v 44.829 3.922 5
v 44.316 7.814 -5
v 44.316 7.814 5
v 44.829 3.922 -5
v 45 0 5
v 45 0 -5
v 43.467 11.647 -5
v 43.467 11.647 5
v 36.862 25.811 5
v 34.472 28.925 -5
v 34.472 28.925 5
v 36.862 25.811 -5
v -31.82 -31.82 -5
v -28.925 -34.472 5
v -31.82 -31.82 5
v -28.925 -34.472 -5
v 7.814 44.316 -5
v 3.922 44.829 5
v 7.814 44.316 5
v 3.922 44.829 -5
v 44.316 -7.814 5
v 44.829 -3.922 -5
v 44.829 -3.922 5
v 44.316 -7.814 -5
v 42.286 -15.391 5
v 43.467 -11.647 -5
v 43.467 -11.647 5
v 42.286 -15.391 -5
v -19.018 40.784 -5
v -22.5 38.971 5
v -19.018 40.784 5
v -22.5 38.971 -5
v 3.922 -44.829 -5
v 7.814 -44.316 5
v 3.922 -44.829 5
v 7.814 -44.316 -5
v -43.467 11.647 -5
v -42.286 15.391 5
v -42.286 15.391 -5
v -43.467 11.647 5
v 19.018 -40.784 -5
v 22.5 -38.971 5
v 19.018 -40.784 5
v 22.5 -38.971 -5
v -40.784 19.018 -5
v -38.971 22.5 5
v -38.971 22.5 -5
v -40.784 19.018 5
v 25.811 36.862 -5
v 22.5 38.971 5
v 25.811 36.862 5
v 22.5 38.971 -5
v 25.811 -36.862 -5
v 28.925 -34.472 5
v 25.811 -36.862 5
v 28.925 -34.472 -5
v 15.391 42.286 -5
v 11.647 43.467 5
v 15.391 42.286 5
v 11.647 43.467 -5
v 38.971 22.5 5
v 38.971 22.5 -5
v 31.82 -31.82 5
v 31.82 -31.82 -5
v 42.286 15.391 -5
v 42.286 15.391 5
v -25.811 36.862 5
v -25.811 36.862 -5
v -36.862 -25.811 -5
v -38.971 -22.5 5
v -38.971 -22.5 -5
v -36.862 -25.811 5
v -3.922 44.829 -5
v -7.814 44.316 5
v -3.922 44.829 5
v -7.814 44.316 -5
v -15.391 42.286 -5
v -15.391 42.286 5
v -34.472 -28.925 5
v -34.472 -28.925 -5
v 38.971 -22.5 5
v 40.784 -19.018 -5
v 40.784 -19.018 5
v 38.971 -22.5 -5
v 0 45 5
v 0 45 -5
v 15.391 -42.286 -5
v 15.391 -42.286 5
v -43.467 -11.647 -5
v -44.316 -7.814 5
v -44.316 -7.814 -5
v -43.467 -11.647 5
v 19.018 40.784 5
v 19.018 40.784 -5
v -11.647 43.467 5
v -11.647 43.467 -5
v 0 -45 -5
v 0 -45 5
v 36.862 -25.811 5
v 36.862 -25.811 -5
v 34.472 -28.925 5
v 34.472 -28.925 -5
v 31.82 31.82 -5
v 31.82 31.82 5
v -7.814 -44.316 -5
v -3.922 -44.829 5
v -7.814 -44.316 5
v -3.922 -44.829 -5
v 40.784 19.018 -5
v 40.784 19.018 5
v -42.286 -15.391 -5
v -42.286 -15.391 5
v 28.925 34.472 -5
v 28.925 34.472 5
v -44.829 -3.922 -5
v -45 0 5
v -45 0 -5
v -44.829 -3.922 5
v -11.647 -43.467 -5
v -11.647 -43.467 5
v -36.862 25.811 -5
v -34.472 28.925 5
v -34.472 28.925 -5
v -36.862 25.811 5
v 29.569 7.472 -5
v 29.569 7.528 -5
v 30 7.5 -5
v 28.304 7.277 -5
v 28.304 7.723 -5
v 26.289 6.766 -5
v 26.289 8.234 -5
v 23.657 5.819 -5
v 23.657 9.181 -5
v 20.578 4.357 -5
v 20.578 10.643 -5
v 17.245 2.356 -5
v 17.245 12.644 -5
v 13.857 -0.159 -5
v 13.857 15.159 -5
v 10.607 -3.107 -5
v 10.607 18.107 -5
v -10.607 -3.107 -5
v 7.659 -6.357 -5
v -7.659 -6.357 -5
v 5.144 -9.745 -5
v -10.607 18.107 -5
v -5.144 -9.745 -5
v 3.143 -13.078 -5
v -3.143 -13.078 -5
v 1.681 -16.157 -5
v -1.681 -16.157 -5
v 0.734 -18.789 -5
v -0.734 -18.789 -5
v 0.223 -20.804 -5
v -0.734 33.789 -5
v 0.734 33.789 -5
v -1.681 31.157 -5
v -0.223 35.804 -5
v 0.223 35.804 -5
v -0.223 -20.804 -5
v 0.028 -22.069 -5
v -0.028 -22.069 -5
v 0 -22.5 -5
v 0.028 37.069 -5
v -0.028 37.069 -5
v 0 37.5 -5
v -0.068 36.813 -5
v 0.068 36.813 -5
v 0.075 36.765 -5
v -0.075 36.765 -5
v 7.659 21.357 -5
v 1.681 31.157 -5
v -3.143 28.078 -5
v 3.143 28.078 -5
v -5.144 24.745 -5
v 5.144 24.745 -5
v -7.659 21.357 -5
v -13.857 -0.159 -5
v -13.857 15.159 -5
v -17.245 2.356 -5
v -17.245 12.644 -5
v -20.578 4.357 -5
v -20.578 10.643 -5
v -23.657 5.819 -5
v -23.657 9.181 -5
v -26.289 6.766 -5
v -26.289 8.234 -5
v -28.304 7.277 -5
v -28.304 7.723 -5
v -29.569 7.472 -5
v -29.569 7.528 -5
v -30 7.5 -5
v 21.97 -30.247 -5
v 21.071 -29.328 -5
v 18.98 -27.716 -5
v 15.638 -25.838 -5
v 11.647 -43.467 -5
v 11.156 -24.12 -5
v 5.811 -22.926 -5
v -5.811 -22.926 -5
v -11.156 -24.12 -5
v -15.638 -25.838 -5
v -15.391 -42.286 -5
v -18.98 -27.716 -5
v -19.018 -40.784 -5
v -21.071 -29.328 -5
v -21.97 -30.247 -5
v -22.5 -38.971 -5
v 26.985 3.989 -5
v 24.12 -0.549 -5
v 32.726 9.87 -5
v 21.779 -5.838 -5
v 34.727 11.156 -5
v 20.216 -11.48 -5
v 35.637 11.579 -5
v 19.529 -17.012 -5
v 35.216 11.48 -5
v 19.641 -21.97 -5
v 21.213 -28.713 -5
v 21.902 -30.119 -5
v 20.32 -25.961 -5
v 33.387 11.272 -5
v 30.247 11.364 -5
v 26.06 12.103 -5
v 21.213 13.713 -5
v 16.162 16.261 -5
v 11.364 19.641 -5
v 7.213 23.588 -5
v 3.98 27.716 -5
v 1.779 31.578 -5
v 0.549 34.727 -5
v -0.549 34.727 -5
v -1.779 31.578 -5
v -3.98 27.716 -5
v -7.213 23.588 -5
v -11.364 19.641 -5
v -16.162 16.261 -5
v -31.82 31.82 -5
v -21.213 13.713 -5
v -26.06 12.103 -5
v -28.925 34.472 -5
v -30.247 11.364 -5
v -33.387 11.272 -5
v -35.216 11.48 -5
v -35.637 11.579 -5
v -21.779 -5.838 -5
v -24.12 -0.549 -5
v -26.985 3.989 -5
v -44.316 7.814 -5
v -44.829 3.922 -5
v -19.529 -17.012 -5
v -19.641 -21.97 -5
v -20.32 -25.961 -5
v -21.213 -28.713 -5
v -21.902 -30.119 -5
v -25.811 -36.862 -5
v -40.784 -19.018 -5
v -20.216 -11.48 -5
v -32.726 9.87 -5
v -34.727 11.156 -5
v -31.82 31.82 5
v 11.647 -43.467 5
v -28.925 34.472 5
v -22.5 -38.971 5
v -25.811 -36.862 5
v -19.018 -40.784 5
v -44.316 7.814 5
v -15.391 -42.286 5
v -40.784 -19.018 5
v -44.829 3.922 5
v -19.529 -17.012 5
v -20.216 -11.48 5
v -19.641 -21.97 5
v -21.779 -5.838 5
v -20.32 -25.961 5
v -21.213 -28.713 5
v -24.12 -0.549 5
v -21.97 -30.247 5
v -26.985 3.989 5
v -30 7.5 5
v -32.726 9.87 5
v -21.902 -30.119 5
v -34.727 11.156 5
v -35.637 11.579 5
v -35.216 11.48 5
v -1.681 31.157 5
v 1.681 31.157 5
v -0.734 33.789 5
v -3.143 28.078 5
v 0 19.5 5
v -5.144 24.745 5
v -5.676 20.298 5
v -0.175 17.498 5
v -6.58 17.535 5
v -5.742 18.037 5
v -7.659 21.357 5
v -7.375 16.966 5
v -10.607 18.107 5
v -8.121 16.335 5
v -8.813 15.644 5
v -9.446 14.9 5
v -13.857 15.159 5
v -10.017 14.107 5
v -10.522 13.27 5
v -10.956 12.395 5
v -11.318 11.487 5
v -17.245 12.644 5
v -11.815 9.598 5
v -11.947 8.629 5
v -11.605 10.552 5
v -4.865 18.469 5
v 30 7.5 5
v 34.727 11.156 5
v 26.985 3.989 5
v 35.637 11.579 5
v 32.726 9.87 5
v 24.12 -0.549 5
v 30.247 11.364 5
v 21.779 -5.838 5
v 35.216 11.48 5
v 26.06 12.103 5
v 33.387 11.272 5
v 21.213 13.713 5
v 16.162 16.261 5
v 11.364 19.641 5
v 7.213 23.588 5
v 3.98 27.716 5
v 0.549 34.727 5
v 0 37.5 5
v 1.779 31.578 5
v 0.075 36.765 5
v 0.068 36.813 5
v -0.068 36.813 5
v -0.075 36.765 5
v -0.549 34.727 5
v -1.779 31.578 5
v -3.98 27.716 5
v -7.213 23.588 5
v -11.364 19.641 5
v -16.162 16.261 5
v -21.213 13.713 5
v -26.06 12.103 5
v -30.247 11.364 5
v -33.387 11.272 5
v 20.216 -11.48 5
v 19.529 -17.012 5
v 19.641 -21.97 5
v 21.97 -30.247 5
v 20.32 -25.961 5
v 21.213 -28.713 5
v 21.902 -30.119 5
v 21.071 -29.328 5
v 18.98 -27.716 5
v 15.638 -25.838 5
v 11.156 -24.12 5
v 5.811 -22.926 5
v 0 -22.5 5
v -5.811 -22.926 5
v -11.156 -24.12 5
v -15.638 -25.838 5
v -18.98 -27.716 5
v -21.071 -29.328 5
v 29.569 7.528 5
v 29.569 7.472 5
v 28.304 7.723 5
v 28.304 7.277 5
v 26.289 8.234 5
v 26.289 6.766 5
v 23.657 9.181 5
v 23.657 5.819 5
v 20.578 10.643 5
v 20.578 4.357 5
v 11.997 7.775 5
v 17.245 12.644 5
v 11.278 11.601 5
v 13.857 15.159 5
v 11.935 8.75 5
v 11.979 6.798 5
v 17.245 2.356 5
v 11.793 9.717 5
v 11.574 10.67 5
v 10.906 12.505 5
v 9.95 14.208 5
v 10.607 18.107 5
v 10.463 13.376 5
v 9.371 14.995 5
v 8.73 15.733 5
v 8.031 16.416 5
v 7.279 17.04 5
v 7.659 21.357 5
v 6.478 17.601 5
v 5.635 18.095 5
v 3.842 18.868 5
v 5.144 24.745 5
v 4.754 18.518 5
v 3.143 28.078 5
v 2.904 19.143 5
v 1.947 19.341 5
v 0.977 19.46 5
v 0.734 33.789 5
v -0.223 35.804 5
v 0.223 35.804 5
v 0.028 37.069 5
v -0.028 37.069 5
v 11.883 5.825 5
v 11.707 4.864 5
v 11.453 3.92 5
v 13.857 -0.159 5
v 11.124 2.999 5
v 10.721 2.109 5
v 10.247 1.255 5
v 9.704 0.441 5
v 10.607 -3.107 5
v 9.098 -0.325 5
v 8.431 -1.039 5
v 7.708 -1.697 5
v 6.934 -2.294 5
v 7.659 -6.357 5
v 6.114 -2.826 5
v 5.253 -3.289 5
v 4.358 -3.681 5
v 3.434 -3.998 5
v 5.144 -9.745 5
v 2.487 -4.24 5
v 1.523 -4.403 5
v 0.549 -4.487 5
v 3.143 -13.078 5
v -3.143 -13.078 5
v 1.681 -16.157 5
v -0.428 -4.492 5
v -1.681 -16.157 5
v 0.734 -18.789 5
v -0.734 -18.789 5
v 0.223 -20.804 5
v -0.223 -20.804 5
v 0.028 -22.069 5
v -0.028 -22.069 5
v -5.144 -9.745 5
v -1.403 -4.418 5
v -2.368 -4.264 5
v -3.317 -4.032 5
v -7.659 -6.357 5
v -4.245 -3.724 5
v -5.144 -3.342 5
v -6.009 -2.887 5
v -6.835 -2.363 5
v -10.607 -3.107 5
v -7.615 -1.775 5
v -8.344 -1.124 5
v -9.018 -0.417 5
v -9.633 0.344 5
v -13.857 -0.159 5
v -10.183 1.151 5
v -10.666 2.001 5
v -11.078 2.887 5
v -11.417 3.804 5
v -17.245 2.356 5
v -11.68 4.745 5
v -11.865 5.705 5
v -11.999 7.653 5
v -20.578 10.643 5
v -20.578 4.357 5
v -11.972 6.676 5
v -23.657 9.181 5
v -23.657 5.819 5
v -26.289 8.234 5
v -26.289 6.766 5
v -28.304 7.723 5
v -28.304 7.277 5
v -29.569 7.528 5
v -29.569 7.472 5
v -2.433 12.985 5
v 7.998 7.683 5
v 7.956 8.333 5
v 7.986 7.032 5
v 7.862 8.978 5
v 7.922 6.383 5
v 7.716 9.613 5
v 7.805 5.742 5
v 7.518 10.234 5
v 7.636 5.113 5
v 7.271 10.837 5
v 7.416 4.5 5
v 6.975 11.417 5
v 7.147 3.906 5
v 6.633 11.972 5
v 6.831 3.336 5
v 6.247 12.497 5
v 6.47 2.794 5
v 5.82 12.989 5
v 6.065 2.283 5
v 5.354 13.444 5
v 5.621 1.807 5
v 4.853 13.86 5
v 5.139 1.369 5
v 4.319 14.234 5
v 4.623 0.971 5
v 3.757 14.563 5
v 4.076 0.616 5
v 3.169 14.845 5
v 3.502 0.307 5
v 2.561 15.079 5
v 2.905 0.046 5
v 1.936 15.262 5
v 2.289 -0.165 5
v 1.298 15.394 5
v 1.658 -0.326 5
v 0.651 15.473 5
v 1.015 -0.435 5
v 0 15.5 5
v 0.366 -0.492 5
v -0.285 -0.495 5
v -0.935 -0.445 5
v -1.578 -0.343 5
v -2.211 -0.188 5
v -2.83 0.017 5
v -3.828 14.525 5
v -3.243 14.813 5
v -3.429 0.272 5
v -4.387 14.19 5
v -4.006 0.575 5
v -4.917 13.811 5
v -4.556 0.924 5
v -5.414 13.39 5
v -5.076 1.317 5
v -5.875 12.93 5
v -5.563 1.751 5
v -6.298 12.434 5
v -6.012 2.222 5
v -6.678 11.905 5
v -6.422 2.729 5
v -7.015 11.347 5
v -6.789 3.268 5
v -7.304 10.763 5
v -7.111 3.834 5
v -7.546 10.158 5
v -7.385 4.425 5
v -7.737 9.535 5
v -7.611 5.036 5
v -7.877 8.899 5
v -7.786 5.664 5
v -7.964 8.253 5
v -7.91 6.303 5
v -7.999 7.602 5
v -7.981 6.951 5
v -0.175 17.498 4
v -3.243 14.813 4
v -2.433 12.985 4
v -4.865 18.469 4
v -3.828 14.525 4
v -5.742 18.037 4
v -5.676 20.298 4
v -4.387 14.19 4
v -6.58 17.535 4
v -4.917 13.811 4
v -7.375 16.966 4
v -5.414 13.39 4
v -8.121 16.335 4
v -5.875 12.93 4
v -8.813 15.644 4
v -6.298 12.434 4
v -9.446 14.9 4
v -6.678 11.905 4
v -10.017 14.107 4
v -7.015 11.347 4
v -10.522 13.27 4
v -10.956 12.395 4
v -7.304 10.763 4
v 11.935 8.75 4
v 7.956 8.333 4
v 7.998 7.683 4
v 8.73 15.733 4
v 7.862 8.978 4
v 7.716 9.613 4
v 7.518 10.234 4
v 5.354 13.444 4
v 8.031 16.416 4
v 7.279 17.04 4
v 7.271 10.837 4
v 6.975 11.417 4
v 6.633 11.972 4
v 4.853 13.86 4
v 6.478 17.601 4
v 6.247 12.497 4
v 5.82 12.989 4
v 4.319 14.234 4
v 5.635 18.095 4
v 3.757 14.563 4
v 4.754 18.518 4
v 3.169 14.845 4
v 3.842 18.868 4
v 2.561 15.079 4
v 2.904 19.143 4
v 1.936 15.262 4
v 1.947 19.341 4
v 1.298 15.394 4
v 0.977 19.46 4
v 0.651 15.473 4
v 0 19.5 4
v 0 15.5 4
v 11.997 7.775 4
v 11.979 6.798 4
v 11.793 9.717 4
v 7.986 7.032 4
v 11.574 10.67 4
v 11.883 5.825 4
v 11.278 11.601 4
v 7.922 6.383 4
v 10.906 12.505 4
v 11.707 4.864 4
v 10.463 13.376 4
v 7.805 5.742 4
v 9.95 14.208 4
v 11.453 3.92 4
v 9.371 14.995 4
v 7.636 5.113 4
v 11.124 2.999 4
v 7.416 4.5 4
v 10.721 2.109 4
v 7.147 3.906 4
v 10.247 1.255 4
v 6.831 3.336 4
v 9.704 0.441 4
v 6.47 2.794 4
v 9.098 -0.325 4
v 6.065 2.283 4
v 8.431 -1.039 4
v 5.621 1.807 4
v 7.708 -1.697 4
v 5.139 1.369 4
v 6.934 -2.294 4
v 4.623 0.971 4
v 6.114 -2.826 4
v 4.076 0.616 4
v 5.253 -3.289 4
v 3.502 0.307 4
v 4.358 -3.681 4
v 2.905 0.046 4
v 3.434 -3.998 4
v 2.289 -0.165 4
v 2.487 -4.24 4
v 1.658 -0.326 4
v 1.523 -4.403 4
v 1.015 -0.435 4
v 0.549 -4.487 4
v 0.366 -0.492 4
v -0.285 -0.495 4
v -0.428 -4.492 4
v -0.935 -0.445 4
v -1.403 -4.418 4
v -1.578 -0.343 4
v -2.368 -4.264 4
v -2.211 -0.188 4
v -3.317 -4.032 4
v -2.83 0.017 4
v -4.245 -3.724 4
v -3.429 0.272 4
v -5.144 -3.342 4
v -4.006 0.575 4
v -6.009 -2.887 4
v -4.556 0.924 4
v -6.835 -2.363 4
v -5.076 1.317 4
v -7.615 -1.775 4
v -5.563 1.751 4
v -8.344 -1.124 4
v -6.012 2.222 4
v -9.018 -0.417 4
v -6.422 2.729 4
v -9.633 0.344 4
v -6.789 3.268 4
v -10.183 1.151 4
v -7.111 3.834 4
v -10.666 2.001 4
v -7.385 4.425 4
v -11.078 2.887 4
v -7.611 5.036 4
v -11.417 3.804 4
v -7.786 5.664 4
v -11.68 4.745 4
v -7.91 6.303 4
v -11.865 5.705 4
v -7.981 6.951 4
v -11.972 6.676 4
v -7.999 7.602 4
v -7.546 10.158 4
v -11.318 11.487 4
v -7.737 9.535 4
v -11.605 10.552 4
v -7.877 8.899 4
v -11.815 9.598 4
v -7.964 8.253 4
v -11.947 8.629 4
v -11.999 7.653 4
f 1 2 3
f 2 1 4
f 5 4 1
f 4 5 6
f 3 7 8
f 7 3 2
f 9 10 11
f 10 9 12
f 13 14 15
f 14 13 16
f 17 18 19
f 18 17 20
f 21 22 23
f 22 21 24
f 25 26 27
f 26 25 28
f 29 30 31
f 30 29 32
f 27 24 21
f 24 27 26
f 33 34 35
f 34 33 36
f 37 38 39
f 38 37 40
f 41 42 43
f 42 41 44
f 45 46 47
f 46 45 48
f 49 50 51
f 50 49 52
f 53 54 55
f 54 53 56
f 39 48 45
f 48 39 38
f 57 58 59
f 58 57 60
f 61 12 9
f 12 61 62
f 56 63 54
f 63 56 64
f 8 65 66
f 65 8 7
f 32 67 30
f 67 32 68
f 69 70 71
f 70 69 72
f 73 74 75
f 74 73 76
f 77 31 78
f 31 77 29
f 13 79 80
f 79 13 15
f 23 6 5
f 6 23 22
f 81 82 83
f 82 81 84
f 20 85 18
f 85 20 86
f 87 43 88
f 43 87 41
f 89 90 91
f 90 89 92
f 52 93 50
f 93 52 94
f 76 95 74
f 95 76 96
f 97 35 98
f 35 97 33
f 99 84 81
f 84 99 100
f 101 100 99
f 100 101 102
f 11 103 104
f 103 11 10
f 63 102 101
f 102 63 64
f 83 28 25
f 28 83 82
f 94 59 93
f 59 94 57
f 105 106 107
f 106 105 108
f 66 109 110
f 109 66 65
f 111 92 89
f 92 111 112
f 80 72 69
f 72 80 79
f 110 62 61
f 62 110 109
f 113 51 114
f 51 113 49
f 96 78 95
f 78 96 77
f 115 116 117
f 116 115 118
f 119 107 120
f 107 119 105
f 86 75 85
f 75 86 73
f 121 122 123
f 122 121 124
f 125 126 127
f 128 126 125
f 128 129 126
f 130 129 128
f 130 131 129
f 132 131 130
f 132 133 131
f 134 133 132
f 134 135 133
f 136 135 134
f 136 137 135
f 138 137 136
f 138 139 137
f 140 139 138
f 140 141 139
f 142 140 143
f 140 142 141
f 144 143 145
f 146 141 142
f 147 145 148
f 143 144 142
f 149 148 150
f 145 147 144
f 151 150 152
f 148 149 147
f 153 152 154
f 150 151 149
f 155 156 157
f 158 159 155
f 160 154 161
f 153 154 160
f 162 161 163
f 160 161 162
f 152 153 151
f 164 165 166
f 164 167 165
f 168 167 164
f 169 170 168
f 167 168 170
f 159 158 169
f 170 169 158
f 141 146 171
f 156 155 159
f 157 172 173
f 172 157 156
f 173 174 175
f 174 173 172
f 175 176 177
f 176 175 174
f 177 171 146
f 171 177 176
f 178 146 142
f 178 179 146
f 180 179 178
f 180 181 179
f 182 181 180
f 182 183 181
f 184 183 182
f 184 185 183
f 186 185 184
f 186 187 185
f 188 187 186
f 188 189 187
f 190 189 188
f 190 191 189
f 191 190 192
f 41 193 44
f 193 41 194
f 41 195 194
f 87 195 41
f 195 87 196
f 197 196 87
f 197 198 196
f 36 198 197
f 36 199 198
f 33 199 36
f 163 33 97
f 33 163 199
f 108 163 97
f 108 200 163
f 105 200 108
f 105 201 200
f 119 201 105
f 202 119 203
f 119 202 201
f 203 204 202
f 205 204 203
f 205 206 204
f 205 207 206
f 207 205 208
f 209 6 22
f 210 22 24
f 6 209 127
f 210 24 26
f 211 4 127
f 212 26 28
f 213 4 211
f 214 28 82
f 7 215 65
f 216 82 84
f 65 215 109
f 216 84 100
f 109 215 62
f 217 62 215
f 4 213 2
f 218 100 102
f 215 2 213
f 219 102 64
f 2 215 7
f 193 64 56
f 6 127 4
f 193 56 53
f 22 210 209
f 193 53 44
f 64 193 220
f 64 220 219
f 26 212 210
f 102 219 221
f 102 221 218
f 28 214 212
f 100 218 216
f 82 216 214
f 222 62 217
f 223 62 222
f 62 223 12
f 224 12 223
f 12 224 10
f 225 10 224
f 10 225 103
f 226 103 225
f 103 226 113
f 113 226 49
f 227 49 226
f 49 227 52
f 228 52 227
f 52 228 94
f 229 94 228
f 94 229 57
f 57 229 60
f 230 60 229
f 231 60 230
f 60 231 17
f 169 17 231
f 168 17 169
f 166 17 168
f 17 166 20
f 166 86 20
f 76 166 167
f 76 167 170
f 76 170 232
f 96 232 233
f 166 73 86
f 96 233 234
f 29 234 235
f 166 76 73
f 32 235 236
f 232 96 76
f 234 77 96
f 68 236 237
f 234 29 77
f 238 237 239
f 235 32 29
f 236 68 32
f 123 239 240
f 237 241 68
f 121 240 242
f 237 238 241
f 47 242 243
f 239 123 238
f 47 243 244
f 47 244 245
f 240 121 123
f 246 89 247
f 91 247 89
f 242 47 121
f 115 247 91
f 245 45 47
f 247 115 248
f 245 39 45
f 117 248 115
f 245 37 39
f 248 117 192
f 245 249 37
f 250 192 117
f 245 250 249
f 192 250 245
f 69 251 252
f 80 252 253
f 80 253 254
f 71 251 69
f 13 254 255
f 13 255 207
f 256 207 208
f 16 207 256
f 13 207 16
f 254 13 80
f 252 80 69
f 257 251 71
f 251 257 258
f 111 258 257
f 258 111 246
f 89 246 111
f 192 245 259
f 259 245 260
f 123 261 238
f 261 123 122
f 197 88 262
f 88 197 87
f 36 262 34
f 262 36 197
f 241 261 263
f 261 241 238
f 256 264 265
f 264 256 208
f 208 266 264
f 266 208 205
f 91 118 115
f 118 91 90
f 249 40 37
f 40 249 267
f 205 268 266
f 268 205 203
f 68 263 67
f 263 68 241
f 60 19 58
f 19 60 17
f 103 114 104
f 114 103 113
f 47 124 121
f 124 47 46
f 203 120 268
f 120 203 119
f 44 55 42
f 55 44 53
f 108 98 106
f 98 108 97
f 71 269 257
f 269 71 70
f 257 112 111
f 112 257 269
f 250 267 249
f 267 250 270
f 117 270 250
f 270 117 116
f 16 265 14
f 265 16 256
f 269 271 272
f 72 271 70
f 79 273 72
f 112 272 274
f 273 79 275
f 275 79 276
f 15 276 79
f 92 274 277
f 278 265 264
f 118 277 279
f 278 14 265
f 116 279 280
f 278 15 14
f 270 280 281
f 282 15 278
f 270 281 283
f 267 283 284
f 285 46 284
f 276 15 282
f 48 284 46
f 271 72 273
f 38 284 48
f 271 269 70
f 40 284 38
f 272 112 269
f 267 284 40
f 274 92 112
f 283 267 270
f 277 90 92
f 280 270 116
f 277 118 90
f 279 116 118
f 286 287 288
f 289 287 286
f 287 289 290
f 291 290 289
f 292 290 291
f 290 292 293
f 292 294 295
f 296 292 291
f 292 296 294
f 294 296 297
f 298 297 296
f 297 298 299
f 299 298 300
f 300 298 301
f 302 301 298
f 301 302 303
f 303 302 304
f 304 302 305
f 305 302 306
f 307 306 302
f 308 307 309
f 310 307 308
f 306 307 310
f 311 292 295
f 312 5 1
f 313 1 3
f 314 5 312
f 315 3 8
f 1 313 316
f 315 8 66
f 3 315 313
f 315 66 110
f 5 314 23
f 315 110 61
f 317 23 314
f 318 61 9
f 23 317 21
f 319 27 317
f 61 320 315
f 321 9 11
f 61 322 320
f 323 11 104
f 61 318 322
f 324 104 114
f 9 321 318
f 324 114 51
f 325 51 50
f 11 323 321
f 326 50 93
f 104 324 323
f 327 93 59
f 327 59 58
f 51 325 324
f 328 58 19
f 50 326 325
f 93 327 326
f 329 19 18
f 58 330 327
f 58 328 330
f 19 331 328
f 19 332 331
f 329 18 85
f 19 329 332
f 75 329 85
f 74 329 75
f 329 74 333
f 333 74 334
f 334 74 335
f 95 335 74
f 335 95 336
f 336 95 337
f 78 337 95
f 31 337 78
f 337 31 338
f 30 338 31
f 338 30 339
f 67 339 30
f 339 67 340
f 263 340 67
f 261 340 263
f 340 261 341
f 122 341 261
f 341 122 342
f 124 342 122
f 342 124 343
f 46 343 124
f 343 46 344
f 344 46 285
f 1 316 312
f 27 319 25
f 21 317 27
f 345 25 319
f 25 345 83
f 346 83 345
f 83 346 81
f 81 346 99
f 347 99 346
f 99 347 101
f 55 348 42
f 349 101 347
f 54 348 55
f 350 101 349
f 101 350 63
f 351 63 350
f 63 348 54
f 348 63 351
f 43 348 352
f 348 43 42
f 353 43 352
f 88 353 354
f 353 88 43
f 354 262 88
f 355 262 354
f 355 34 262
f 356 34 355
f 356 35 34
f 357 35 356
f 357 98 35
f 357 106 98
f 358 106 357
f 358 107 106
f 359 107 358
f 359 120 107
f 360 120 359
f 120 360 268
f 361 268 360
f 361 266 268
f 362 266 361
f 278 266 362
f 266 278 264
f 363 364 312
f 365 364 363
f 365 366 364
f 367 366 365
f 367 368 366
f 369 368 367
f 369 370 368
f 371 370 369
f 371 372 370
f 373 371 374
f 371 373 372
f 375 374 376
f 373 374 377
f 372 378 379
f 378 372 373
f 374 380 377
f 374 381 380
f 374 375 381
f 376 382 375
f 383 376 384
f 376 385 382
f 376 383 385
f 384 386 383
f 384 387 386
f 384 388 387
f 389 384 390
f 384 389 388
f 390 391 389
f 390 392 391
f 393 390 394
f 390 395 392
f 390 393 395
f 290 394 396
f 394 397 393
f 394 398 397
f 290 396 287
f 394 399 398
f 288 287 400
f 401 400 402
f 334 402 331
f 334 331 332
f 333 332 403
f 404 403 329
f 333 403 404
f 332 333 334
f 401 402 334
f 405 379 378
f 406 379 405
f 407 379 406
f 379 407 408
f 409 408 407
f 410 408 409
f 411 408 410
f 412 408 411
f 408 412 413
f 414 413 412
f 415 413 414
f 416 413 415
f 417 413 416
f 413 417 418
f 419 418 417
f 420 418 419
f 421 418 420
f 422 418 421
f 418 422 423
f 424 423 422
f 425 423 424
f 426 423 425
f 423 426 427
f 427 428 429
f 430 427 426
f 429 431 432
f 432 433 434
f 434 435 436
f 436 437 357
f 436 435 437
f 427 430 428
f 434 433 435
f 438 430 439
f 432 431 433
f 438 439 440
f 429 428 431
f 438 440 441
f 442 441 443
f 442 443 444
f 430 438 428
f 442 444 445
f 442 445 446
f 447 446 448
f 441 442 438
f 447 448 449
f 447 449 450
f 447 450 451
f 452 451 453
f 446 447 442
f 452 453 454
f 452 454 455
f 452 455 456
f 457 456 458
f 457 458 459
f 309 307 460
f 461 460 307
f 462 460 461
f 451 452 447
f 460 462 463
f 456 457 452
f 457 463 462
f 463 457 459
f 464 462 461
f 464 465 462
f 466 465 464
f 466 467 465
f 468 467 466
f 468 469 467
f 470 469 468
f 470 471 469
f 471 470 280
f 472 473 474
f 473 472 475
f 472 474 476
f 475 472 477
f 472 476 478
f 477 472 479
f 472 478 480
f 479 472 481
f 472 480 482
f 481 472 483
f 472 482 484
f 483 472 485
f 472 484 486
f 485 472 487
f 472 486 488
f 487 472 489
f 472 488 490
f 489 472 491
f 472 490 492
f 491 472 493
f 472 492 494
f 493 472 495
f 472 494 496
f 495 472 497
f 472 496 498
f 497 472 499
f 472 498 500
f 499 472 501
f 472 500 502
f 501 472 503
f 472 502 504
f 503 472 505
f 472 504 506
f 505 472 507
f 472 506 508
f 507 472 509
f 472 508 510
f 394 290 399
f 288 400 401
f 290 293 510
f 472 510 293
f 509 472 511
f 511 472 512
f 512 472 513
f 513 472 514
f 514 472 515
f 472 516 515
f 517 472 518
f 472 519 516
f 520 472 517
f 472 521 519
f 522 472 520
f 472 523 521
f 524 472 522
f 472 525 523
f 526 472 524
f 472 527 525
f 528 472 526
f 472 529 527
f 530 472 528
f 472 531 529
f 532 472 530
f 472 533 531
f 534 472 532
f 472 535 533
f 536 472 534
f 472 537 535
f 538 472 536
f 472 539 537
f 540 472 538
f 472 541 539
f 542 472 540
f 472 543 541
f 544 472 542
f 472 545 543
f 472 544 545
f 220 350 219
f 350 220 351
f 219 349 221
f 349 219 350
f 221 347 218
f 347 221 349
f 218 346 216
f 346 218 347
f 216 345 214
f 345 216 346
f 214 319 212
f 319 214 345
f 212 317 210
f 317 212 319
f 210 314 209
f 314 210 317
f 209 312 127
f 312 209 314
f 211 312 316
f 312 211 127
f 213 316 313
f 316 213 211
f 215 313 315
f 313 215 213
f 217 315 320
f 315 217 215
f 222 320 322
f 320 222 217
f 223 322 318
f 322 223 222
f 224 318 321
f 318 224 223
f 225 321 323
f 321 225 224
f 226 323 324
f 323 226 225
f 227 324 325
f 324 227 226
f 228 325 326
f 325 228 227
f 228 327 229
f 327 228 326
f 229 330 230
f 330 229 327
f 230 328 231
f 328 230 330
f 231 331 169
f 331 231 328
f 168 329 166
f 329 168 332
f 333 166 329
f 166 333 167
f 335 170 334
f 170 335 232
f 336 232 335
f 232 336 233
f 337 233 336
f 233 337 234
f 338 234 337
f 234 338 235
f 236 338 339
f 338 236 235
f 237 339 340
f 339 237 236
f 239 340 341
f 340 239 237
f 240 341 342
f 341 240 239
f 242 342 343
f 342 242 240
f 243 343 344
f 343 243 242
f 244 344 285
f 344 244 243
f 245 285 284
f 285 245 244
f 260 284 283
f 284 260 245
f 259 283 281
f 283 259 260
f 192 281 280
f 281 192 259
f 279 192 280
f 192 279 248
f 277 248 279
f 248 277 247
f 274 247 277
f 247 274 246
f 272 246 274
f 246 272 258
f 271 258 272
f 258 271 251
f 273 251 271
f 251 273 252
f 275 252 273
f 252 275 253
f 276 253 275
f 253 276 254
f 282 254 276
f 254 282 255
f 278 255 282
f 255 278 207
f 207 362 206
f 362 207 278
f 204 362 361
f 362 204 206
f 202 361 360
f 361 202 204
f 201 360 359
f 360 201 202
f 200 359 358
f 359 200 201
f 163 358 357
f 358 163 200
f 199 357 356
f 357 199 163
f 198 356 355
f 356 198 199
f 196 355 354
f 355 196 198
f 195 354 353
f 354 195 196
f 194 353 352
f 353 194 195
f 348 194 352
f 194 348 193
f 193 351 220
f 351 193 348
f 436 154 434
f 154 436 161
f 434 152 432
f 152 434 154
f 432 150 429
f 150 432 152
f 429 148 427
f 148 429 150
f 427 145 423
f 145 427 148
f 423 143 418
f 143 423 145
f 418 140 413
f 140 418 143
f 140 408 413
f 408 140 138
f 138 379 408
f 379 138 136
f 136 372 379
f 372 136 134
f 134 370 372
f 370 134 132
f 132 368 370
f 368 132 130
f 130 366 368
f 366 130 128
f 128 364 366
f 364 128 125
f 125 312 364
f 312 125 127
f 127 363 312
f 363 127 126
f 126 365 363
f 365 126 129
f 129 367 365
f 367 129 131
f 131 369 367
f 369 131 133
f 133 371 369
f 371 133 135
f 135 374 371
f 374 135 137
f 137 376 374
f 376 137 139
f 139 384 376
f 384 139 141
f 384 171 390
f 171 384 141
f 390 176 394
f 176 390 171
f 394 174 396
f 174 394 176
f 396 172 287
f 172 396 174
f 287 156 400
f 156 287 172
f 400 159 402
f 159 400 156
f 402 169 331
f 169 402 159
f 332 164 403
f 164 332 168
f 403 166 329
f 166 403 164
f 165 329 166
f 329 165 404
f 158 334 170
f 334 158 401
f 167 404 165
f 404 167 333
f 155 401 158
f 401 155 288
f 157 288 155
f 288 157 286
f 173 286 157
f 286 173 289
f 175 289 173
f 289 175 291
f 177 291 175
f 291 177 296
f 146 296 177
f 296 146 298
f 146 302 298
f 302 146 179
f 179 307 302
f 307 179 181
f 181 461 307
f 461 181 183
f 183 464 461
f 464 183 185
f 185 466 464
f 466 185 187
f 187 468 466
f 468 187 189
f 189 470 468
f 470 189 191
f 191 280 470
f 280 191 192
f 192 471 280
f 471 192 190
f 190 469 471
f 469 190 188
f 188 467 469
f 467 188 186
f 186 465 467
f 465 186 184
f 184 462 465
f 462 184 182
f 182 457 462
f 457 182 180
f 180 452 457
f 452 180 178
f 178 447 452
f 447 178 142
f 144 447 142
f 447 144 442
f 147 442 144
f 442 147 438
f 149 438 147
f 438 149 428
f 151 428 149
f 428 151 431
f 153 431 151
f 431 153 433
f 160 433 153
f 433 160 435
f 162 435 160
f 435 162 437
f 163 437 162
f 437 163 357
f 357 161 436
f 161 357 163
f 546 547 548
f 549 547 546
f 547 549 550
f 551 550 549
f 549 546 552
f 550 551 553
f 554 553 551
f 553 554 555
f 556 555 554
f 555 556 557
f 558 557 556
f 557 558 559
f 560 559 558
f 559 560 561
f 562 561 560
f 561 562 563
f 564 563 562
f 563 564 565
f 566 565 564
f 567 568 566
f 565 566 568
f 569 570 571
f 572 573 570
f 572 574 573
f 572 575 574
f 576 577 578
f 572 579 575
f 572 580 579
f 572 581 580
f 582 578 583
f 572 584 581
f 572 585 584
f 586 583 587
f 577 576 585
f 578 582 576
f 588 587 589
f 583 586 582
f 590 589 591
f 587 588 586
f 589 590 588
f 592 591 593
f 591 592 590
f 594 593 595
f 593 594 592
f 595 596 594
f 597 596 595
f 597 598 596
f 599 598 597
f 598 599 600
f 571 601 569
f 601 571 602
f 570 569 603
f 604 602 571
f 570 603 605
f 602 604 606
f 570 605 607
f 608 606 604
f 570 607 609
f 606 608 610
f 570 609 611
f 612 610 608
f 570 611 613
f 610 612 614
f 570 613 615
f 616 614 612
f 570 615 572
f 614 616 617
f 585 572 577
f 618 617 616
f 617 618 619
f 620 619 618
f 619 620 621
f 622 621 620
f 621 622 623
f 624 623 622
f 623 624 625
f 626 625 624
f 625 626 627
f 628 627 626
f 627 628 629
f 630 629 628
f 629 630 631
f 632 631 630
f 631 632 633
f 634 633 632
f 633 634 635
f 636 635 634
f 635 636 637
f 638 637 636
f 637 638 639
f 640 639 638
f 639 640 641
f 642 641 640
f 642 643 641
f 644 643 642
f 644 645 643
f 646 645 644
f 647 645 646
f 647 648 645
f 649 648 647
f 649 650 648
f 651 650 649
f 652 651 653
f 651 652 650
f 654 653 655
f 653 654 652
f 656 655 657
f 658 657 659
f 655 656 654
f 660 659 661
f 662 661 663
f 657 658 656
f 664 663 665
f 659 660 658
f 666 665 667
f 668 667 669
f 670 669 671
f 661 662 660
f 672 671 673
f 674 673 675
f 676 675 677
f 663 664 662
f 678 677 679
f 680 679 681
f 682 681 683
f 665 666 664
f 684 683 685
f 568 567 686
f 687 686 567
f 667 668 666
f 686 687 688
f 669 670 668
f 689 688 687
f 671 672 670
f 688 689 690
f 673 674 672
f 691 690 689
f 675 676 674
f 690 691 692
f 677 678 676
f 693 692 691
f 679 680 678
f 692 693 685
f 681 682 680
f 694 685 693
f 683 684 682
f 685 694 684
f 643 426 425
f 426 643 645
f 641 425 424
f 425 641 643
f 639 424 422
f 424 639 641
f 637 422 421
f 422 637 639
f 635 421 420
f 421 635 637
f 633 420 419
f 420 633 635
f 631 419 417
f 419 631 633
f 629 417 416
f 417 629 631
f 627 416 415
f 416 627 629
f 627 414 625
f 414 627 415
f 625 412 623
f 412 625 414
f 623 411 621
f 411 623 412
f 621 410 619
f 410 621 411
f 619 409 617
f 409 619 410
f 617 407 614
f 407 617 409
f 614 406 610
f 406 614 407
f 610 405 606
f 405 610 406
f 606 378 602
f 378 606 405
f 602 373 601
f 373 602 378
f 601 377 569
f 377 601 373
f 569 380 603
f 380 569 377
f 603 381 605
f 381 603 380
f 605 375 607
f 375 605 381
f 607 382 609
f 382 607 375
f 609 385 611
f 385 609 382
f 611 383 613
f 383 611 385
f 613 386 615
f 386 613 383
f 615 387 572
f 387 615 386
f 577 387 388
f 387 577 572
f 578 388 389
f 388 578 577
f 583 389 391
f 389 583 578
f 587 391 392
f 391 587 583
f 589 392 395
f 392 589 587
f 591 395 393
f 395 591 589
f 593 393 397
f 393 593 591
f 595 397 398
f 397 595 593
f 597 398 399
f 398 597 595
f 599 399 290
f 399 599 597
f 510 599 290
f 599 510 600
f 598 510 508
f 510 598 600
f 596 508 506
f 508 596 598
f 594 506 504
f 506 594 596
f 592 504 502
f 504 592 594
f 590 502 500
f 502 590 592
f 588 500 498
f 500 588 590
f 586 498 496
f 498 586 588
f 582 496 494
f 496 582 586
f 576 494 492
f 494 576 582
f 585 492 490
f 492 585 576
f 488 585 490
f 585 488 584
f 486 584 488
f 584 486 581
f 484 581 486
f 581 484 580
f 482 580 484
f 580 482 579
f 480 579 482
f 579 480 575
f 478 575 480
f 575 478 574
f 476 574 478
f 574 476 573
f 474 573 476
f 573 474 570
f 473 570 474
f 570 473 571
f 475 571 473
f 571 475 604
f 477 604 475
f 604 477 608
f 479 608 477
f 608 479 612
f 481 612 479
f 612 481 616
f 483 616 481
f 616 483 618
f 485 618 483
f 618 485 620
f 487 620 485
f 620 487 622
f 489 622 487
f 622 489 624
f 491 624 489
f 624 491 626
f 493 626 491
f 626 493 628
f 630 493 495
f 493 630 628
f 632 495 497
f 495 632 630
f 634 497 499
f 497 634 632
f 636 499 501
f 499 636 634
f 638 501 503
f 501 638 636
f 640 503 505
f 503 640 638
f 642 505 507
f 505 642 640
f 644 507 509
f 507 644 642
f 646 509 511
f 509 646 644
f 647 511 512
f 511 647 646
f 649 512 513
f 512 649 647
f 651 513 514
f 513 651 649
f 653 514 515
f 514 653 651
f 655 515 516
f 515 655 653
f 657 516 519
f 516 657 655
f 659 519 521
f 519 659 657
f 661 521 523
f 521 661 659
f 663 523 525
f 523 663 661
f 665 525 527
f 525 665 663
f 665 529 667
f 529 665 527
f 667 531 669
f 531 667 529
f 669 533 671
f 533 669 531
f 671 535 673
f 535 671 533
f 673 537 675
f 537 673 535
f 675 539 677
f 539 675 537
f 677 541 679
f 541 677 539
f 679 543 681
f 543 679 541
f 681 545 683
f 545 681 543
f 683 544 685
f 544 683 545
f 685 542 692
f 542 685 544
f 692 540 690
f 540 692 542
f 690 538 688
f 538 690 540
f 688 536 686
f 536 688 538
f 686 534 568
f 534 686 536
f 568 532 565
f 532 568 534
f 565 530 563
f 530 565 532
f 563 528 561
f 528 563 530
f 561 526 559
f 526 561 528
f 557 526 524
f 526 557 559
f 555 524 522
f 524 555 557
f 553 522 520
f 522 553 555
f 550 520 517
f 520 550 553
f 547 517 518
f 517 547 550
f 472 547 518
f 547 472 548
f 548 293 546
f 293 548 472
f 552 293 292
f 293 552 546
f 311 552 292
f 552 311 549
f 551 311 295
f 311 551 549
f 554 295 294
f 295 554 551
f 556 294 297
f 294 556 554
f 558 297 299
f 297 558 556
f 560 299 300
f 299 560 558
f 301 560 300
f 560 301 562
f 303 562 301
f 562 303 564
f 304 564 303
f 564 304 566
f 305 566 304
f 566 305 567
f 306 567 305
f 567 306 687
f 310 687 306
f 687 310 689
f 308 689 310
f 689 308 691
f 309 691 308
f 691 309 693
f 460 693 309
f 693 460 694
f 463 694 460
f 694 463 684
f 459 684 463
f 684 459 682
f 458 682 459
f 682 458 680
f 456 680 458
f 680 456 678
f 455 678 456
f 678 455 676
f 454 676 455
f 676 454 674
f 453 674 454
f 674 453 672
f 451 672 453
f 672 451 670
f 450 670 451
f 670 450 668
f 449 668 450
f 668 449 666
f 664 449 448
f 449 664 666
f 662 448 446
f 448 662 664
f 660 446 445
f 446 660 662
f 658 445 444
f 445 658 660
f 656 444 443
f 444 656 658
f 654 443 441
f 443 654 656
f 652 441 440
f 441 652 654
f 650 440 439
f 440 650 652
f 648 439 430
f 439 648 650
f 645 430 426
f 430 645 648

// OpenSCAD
// Requires 'concat' builtin.  If you don't have it, go to
// http://www.openscad.org/downloads.html and get a development snapshot.
//
// Totally worth the trouble.  You can now make a procedural polygon
// in one shot, instead of unioning n 3d objects!

// How large an angle is length l along a curve of radius r?
function l2a(l, r) = (360*l)/(3.14159 * 2 * r);
// How long is a degress along a curve of radius r?
function a2l(a, r) = (2*3.14159*r) * (a/360);

// Makes a pie shape of radius 'r', angle 'a', height 'h'.
// Is just a 2d polygon if no 'h' is specified.
//
// Do not touch 'steps', 'mstep', or 'arr', they set themselves according to
// the values of $fn, $fa, $fs.
//
// Don't use for circles, that's what circle() or cylinder() are for.
module pie(a=90, r=2, h=0, steps=0, mstep=0, arr=[]) {
	// For less mess I should separate this into two calls, one which sets
	// up everything recursive.  For now it just checks for an empty array
	// before doing setup.

	if(len(arr) == 0)
	{
//		echo("special first case");
		if($fn > 0)
		{
			pie(a, r, h, $fn, $fn, [ [0,0] ]);
			/* fragments by $fa:  a / $fa					*/
			/* fragments by $fs:  (a * 2 * pi * r)/(360*$fs) */
		} else assign(frag=ceil(min(a/$fa,(a*2*3.14159*r)/(360*$fs))))
			pie(a, r, h, frag, frag, [ [0,0] ]);

		//	The old way, using $fa alone
		//	pie(a, ceil(a/$fa), ceil(a/$fa), [ [0,0] ], r);
	}
	else if(steps >= 0)
	{
		assign(angle = a-((a/mstep) * steps))
			pie(a, r, h, steps-1, mstep, concat(arr, [ r*[sin(angle),cos(angle)]]));
	}
	else {
		if(h != 0) linear_extrude(h) polygon(arr);
		else						polygon(arr);
	}
}

module curved_arrow(r=20, w=2, length=20, arrow=2, a1=[], step, mstep=0,
	a=0, h=0, center=false) {
	if(mstep == 0) {
		// echo("special first case");
		if(a != 0)
			curved_arrow(r, w, a2l(r, a), arrow, [], 0, ceil(a / $fa),
				h=h, center=center);
		else if(length != 0)
			curved_arrow(r, w, length, arrow, [], 0, ceil(l2a(length,r) / $fa),
				h=h, center=center);
	}
	else if(step <= mstep)
	assign(maxa=l2a(length-(arrow+w),r)) assign(a=(step*maxa)/mstep)
	{
		curved_arrow(r, w, length, arrow,
			concat([	(r-w)*[sin(a),cos(a)] ], a1, [	(r+w)*[sin(a),cos(a)] ]),
			step+1, mstep,h=h, center=center);
	}
	else assign(maxa=l2a(length,r), lasta=l2a(length-(arrow+w),r))
	{
		if(h == 0)
		polygon(concat(a1, [
				(r+w+arrow)*[sin(lasta),cos(lasta)],
				          r*[sin(maxa),cos(maxa)],
				(r-(w+arrow))*[sin(lasta),cos(lasta)]
			]	));
		else linear_extrude(h, center=center) polygon(concat(a1, [
				(r+w+arrow)*[sin(lasta),cos(lasta)],
				          r*[sin(maxa),cos(maxa)],
				(r-(w+arrow))*[sin(lasta),cos(lasta)]
			]	));
	}
}

/*module troch(r1=3, r2=1, m=4, step=0, mstep=64, arr=[])
assign(w1 = 360 * (step/mstep), w2=360*(m)*(step/mstep) ) {
	if(step < mstep) {
		troch(r1, r2, m, step+1, mstep,
			concat(arr, [
					(r1 * [ sin(w1), cos(w1) ]) +
					(r2 * [ sin(w1-w2), cos(w1-w2) ])
				]));
	}
	else
	{
		echo(arr);
		polygon(arr);
	}
}*/


$fa=5;

// Do not ask me to explain this it took far too much fiddling :D
module rtroch_b(r1=30, n=5, step=0, mstep=64, arr=[])
assign(r2 = ((n+1)/(n-1)) * (r1 / (n+1)))
assign(a1=(step*360)/mstep, a2=(step*360*r1)/(mstep*r2)) {
	if(step < mstep) {
		rtroch_b(r1, n, step+1, mstep, concat(arr, [
				((r1)*[sin(a1),cos(a1)]) + r2*[-sin(a2),cos(a2)]
			]));
	}
	else
	{
		echo("r2b",r2);
		polygon(arr);
	}
}

rotate([0,0,-(20*360*$t)/5]) difference() {	
	cylinder(r=45, center=true, h=10);
	linear_extrude(11, center=true, convexity=3) rtroch_b(n=5);
}

translate([0,7.5,0]) rotate([0,0,-(20*360*$t)/4]) difference() {
	linear_extrude(10, center=true, convexity=4) rtroch_b(n=4, r1=30-7.5);
	translate([0,0,4]) curved_arrow(r=10, a=359, arrow=2, h=2);
}




//translate([0,0,2]) troch_b();
//						troch_a();
/*difference() {
	pie(r=20, a=270, h=1);
	translate([0,0,.5]) rotate([0,0,-5])
		curved_arrow(r=15, a=260, arrow=1.5, h=1);
}*/
